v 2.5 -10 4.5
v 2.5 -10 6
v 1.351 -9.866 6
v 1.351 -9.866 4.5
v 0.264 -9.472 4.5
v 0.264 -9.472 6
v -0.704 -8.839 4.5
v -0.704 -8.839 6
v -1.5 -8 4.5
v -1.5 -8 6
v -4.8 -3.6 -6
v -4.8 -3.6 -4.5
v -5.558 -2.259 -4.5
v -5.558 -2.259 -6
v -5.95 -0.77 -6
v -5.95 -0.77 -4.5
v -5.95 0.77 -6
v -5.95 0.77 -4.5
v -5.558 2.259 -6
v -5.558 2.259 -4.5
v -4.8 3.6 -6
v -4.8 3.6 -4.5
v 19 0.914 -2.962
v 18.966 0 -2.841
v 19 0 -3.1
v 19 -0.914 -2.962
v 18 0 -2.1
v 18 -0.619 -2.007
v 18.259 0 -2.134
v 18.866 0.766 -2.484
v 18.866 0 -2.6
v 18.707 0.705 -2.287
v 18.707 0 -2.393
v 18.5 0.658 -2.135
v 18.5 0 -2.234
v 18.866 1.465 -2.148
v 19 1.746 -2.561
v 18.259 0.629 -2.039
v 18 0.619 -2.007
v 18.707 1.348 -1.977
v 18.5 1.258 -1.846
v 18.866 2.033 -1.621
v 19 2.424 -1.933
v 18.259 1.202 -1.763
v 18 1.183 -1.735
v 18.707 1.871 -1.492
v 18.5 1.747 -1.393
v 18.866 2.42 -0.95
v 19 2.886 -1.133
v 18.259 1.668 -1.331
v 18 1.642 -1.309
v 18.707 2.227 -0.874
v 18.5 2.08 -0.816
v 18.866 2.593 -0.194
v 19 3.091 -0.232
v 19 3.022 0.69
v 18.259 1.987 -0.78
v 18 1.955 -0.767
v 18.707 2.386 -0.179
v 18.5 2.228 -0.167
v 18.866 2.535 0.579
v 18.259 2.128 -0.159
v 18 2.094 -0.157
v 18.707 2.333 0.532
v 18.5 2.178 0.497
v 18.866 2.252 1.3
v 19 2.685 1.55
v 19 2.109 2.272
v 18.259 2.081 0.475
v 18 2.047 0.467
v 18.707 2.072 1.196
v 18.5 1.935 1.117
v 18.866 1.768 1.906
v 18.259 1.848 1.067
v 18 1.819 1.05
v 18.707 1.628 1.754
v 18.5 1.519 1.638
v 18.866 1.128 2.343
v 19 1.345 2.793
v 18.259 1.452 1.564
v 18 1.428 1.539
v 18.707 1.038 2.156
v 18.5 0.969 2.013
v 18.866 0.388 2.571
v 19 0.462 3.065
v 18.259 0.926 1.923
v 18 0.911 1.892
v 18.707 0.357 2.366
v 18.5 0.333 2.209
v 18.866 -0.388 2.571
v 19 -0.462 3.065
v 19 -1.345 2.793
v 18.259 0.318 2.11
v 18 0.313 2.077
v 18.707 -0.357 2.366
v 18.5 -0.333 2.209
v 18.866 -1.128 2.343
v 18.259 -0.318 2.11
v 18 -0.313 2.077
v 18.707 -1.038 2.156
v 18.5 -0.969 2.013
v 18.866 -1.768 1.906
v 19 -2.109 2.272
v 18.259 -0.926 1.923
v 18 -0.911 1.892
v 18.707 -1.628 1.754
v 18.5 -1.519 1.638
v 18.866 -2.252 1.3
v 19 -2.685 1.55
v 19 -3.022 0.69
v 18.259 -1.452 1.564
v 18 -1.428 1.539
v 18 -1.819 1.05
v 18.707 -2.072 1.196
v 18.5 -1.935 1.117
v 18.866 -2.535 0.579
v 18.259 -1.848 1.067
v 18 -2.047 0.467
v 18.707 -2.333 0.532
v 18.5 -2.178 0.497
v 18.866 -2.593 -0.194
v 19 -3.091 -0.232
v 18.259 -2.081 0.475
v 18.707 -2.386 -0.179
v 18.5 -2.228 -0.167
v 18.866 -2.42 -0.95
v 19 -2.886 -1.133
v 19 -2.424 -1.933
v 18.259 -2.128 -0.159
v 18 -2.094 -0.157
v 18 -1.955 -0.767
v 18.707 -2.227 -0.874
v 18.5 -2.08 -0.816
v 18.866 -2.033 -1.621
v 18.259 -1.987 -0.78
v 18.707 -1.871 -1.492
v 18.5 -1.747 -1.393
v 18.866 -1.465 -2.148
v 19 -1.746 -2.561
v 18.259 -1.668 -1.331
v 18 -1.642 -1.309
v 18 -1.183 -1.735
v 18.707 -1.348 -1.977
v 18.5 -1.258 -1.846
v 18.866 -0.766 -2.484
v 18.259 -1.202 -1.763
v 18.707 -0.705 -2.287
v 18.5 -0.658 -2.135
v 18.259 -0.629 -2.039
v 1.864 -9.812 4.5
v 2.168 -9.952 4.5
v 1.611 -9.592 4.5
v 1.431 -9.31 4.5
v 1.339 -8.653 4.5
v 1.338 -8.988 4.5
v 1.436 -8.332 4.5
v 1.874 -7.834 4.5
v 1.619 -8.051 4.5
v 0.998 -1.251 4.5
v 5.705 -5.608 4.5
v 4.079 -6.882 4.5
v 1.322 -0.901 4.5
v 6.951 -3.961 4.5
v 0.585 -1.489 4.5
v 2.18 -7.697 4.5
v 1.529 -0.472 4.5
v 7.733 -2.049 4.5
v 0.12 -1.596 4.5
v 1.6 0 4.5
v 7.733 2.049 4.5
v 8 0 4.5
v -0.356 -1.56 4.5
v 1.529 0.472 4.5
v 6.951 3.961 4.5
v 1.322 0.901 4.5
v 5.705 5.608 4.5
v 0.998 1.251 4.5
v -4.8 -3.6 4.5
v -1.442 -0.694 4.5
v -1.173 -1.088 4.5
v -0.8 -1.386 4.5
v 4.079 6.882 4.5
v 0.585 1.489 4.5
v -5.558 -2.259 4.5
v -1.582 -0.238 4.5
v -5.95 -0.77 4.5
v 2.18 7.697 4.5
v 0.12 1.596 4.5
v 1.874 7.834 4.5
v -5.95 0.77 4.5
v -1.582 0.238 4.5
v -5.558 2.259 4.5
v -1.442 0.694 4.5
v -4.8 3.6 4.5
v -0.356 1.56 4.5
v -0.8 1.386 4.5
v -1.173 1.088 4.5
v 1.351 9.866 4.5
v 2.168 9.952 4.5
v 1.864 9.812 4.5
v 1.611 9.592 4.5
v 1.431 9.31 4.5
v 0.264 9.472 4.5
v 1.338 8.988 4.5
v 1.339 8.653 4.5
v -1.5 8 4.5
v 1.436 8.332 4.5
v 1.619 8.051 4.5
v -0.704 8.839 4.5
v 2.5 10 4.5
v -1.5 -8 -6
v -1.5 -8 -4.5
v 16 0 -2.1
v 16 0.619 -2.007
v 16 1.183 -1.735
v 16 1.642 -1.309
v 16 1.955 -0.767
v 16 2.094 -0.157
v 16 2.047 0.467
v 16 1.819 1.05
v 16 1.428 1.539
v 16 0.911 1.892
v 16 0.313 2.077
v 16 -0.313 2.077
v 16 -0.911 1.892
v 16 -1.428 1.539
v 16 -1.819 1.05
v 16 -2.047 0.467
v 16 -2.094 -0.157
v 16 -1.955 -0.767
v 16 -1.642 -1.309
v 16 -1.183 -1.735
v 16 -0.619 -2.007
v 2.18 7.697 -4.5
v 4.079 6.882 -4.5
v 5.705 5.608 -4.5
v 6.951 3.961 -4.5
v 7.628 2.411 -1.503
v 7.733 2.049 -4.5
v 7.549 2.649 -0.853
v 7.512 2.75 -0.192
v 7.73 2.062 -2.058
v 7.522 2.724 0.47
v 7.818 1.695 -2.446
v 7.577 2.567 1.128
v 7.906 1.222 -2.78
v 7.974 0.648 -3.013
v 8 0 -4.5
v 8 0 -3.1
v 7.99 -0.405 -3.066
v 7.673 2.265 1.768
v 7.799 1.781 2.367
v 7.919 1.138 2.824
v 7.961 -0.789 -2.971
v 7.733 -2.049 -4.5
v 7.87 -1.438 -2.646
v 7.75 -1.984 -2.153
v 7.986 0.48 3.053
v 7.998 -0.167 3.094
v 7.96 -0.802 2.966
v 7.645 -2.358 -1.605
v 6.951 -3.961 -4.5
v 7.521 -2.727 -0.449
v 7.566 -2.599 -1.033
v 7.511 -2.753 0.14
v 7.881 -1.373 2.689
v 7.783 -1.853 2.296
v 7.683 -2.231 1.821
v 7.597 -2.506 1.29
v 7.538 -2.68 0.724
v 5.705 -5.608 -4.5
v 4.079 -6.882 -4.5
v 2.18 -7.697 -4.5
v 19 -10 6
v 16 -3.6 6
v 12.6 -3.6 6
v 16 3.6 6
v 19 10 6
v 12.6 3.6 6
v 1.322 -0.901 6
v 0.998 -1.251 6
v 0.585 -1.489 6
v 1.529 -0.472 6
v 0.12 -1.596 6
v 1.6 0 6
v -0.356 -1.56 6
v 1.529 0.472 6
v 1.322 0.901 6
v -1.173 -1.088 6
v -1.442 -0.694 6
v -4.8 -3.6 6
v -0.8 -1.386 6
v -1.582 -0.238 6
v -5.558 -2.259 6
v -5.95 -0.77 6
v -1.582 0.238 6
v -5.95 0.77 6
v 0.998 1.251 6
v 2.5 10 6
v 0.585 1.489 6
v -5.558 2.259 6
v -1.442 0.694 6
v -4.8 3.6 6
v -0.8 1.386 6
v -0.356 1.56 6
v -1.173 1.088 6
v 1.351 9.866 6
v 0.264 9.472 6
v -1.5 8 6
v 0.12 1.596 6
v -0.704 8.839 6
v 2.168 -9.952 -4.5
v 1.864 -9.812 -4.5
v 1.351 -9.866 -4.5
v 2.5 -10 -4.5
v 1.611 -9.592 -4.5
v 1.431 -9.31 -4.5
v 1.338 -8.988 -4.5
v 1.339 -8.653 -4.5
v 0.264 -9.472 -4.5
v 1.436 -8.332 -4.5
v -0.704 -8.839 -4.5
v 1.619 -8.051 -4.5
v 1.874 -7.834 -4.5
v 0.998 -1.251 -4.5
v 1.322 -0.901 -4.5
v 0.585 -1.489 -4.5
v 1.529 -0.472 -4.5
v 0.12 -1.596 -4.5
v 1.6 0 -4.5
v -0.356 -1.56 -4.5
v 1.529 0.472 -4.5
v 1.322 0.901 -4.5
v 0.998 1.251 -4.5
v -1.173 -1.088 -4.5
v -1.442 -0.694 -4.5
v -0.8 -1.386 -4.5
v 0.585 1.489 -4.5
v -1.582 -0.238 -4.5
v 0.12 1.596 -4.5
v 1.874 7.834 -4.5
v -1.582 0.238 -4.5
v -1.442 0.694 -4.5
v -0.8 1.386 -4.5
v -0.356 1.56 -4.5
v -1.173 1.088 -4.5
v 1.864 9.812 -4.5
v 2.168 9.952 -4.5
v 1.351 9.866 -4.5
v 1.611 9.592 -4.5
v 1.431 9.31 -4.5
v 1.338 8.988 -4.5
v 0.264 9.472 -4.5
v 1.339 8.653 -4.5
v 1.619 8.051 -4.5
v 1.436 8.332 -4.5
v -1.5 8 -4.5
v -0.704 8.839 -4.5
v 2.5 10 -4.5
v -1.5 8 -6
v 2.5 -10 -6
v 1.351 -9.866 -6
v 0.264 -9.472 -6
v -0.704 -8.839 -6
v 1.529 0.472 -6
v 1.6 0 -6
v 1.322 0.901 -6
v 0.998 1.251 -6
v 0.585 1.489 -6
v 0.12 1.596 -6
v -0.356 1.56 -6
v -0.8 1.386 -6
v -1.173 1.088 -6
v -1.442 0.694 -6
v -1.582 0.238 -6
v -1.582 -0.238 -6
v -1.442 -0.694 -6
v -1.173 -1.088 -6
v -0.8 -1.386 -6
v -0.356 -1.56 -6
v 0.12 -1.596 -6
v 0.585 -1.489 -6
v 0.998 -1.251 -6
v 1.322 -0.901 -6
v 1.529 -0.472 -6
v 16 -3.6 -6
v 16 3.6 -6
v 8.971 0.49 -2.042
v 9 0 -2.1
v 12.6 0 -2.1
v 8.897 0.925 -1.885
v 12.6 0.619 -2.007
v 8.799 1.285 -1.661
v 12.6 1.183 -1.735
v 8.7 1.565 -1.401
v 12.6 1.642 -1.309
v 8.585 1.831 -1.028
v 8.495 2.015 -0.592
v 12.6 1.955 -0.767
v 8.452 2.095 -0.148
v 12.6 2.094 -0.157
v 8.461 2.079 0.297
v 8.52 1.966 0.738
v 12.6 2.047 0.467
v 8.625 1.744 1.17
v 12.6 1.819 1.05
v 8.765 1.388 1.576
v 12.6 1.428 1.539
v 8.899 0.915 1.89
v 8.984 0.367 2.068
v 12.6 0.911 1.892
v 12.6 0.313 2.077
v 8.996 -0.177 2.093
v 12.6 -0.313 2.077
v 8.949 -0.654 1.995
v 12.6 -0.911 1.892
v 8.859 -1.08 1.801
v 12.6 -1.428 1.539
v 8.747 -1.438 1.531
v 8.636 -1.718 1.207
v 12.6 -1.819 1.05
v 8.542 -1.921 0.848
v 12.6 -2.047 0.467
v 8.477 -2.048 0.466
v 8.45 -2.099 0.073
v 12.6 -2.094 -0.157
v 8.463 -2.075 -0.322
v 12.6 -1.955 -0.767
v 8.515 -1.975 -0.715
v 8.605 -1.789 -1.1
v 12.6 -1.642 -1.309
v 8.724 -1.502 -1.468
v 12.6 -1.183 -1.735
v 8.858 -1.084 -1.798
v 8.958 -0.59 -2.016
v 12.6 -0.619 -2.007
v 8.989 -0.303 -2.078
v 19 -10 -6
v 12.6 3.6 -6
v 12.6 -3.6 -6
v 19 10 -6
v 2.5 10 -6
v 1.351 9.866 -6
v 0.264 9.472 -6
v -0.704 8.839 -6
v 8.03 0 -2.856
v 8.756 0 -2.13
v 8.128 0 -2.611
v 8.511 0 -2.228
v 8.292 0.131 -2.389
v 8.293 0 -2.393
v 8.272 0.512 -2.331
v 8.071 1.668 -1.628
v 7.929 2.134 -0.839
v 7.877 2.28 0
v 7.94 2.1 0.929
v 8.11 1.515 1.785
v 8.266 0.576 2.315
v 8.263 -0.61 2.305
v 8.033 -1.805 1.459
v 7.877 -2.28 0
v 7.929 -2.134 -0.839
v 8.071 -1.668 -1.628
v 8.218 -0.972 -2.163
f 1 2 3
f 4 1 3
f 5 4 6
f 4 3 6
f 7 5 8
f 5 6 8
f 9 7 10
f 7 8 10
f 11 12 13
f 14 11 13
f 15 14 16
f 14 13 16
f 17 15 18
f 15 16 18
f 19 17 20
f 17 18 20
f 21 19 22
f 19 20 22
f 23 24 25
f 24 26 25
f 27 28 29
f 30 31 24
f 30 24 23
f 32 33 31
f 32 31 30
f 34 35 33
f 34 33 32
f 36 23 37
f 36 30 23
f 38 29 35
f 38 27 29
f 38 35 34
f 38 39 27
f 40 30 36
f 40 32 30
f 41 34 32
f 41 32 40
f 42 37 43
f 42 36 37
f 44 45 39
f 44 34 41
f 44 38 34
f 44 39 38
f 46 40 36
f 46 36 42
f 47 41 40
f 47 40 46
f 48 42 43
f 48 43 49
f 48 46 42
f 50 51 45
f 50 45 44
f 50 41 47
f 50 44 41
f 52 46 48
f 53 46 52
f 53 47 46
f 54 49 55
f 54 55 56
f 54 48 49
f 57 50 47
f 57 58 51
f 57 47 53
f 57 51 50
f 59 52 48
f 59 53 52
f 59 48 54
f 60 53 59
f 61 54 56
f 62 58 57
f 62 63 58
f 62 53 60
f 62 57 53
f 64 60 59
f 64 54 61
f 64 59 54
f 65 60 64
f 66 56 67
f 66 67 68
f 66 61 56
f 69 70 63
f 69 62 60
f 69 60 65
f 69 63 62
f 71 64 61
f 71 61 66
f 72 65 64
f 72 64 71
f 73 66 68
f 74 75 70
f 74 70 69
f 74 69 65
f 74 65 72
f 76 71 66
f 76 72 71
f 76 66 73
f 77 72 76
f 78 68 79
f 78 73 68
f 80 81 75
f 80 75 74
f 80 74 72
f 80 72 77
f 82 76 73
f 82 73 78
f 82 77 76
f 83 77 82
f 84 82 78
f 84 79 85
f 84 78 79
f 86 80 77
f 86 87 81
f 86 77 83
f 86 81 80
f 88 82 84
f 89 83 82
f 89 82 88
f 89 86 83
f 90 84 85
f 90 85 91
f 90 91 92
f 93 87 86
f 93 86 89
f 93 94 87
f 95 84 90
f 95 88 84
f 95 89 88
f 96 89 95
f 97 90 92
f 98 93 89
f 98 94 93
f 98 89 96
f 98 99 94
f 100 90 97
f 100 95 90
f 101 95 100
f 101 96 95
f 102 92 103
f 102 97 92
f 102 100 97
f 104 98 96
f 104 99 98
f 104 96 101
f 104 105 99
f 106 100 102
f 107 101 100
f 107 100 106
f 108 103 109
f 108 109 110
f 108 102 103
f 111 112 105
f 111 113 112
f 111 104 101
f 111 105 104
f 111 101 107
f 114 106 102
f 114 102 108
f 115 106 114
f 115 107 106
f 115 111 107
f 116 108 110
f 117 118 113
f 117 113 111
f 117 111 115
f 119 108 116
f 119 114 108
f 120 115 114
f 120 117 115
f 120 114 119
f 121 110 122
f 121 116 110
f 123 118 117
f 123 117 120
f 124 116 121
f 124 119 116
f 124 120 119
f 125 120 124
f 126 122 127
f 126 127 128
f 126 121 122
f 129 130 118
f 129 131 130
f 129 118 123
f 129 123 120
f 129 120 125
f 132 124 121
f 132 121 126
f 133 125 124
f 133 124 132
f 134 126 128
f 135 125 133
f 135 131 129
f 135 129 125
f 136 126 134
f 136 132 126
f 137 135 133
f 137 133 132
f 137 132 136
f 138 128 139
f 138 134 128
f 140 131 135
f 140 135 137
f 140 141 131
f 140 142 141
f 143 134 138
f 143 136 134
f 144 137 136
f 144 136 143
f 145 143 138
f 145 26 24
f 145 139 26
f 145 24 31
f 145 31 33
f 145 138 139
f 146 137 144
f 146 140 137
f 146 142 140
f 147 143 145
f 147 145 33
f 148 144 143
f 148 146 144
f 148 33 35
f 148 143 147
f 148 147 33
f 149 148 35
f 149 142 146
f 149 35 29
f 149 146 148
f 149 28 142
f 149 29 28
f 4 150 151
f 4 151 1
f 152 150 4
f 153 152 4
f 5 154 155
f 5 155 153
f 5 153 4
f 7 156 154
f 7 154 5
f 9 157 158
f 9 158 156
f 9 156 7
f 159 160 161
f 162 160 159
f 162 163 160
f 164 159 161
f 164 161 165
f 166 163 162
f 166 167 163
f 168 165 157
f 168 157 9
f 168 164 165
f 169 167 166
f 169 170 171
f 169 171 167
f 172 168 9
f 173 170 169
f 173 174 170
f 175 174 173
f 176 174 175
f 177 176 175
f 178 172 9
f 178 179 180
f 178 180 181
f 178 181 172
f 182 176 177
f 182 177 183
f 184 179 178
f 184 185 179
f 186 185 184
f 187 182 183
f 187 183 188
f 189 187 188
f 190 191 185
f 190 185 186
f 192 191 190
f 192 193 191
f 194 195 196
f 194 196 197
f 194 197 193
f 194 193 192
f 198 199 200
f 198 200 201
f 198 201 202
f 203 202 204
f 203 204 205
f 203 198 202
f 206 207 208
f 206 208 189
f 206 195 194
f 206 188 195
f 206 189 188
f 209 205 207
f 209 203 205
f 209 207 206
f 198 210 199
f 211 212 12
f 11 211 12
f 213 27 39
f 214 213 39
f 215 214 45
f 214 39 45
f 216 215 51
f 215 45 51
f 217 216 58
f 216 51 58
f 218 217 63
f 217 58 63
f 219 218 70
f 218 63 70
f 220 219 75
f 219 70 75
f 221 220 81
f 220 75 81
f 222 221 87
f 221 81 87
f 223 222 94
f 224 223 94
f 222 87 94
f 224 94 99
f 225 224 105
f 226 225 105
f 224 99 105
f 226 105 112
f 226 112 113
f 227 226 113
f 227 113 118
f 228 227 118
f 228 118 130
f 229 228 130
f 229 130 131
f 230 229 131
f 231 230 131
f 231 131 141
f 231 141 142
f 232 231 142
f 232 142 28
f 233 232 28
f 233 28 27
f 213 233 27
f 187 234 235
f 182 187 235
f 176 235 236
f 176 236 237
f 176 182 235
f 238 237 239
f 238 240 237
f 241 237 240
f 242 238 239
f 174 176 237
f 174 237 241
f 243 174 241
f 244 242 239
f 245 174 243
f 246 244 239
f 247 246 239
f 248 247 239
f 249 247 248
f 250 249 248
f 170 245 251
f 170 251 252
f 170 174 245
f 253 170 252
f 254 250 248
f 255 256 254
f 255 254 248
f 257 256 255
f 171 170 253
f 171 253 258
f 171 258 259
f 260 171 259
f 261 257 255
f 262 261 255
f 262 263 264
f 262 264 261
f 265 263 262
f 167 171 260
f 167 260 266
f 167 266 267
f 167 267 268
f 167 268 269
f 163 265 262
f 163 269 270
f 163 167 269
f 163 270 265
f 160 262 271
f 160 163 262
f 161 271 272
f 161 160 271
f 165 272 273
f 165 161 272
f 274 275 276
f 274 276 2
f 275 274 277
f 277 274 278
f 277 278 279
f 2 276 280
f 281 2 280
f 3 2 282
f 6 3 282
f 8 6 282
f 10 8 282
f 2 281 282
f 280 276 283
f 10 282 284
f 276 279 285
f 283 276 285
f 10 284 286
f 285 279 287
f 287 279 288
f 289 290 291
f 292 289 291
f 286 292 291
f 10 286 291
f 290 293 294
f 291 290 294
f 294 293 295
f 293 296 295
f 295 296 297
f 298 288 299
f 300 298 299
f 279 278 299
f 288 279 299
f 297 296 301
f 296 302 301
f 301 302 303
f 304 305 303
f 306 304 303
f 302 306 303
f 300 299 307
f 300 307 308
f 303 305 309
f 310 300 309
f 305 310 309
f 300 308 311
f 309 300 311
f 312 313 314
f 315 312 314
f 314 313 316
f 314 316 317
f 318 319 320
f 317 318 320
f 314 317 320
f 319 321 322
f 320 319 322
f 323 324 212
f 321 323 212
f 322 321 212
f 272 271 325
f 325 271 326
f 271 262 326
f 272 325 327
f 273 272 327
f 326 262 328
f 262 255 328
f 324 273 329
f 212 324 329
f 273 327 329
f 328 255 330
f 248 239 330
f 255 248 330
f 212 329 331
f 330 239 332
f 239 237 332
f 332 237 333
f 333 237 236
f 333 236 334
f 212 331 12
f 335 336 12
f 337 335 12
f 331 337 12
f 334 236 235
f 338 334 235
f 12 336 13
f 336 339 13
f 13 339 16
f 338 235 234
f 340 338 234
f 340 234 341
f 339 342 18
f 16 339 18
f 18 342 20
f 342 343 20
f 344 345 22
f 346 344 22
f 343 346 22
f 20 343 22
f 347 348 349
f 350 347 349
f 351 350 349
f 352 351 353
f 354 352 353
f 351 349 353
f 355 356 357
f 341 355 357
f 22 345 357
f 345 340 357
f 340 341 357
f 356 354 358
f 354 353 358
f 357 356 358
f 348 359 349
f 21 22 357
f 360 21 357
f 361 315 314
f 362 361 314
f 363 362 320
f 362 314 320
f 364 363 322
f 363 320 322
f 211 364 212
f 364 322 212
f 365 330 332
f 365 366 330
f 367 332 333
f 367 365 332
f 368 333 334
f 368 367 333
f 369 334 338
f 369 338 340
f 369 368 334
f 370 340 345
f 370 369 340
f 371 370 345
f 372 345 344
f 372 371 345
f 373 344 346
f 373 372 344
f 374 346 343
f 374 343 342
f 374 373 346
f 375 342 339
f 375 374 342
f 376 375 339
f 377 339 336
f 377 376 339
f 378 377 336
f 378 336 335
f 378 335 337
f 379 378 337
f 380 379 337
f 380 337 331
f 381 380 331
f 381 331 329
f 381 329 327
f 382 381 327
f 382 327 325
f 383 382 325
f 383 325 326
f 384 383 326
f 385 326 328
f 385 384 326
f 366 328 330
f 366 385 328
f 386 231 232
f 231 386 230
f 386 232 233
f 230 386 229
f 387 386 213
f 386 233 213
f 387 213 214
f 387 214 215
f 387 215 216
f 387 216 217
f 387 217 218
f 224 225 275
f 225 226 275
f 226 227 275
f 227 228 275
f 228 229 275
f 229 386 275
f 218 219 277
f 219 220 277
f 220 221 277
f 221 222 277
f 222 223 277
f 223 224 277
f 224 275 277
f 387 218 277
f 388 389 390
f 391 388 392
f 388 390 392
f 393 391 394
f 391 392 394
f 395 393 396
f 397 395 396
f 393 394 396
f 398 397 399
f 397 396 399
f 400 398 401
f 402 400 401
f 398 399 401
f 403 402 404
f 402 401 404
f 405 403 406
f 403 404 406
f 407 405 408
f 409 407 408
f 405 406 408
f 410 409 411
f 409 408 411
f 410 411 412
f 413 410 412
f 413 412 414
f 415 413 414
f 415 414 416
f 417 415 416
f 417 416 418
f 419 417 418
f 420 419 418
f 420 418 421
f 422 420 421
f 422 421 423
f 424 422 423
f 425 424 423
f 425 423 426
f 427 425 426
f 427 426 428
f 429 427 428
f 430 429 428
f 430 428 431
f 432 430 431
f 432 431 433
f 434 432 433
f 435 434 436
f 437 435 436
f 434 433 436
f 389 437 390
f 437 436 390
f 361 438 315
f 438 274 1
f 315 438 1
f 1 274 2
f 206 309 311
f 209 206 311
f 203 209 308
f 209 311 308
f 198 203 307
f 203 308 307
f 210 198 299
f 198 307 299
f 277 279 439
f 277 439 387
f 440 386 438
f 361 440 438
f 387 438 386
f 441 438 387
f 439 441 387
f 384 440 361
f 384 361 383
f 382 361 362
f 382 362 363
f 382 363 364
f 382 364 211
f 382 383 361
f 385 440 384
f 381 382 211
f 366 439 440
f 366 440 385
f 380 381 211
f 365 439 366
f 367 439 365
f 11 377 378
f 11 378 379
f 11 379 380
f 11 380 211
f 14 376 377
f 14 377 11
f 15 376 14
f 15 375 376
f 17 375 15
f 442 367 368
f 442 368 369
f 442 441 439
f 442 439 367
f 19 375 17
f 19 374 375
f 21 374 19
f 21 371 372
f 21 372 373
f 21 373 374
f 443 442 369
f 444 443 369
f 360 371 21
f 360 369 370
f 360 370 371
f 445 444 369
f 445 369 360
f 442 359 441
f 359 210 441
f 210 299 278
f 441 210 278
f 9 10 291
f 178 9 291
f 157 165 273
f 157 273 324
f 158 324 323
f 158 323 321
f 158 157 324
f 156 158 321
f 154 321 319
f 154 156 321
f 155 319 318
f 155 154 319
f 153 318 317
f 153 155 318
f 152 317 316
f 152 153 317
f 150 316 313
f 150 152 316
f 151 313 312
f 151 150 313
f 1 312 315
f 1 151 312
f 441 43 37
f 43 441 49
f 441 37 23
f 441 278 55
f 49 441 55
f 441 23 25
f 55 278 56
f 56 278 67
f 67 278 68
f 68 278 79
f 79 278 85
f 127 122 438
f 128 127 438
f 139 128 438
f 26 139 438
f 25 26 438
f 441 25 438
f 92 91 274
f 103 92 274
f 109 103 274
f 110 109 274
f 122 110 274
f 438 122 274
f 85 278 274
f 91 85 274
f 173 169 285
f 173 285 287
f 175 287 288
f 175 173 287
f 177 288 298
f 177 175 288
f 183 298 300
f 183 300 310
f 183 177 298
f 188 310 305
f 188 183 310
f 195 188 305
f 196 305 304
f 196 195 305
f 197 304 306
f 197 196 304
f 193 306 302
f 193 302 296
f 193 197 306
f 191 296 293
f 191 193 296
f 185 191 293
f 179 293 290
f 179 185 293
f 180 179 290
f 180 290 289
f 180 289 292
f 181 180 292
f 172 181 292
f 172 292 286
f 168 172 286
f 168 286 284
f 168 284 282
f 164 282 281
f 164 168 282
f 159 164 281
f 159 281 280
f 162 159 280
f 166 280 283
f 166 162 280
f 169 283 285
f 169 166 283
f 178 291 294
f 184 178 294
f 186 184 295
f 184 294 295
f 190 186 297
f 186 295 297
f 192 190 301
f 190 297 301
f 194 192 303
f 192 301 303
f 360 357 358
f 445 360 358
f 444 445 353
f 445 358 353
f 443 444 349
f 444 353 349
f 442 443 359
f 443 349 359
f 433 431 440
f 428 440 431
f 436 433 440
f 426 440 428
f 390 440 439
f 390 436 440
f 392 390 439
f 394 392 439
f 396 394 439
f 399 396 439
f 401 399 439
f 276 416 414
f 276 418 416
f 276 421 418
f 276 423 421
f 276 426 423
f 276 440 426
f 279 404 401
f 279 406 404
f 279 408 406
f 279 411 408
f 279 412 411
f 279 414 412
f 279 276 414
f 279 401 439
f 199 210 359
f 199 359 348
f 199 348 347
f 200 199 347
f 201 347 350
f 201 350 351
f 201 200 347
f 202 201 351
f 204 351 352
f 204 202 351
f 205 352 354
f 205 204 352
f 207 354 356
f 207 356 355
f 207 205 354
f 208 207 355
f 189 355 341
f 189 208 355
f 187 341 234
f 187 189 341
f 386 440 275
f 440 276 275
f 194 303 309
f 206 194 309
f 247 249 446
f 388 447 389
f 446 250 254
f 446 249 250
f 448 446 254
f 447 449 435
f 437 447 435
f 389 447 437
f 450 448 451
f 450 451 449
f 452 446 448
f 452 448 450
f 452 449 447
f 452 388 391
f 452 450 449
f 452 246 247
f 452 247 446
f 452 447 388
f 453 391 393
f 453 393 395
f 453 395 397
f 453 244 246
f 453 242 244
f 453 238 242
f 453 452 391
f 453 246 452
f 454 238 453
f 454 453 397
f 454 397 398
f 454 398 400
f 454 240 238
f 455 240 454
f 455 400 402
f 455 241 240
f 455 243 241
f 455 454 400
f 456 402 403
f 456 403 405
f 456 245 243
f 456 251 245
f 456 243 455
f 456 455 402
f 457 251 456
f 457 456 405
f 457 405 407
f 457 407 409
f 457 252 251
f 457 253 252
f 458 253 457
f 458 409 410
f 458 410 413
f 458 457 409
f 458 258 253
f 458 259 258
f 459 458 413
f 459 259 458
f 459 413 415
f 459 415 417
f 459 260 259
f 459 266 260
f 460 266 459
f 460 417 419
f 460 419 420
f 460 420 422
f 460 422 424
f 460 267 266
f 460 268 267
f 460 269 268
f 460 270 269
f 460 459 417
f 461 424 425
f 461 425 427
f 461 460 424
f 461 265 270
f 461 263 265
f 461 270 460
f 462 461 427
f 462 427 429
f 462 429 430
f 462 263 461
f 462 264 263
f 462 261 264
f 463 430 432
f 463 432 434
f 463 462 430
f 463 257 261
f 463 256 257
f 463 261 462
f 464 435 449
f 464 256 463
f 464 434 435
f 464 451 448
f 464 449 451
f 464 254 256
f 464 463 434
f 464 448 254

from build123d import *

# Parameters (mm, degrees)
SKETCH_1_R          = 1.6
SKETCH_1_W          = 3.4
SKETCH_1_H          = 7.2
EXTRUDE_1_DEPTH     = 6
SKETCH_1_3_R        = 1.6
CUT_EXTRUDE_1_DEPTH = 4.5
SKETCH_2_R          = 2.1
CUT_EXTRUDE_2_DEPTH = 28.586228448
FILLET_1_R          = 1


with BuildPart() as part:
    # Эскиз1 → Бобышка-Вытянуть1 (new, symmetric)
    with BuildSketch(Plane.XY):
        with BuildLine():
            ThreePointArc((-1.5, -8), (0.263932023, -9.472135955), (2.5, -10))
            Line((2.5, -10), (19, -10))
            Line((19, -10), (19, 10))
            Line((19, 10), (2.5, 10))
            ThreePointArc((2.5, 10), (0.263932023, 9.472135955), (-1.5, 8))
            Line((-1.5, 8), (-4.8, 3.6))
            ThreePointArc((-4.8, 3.6), (-6, 0), (-4.8, -3.6))
            Line((-4.8, -3.6), (-1.5, -8))
        make_face()
        Circle(SKETCH_1_R, mode=Mode.SUBTRACT)
        with Locations((14.3, 0)):
            Rectangle(SKETCH_1_W, SKETCH_1_H, mode=Mode.SUBTRACT)
    extrude(amount=EXTRUDE_1_DEPTH, both=True)

    # Эскиз1<3> → Вырез-Вытянуть1 (cut, symmetric)
    with BuildSketch(Plane.XY):
        with BuildLine():
            ThreePointArc((2.18016654, 7.697199092), (1.337547263, 8.987840658), (2.5, 10))
            ThreePointArc((2.5, 10), (0.263932023, 9.472135955), (-1.5, 8))
            Line((-1.5, 8), (-4.8, 3.6))
            ThreePointArc((-4.8, 3.6), (-6, 0), (-4.8, -3.6))
            Line((-4.8, -3.6), (-1.5, -8))
            ThreePointArc((-1.5, -8), (0.263932023, -9.472135955), (2.5, -10))
            ThreePointArc((2.5, -10), (1.337547263, -8.987840658), (2.18016654, -7.697199092))
            ThreePointArc((2.18016654, -7.697199092), (8, 0), (2.18016654, 7.697199092))
        make_face()
        Circle(SKETCH_1_3_R, mode=Mode.SUBTRACT)
    extrude(amount=CUT_EXTRUDE_1_DEPTH, both=True, mode=Mode.SUBTRACT)

    # Эскиз2 → Вырез-Вытянуть2 (cut, through all)
    with BuildSketch(Plane(origin=(19, 0, 0), x_dir=(0, 0, -1), z_dir=(1, 0, 0))):
        Circle(SKETCH_2_R)
    extrude(amount=-CUT_EXTRUDE_2_DEPTH, mode=Mode.SUBTRACT)

    # Скругление1
    fillet_1_edges = [part.edges().sort_by_distance(p)[0] for p in [
        (7.999999993, 1e-09, 2.100000016),
        (19, 0, 2.1),
    ]]
    fillet(fillet_1_edges, radius=FILLET_1_R)


solid = part.part
